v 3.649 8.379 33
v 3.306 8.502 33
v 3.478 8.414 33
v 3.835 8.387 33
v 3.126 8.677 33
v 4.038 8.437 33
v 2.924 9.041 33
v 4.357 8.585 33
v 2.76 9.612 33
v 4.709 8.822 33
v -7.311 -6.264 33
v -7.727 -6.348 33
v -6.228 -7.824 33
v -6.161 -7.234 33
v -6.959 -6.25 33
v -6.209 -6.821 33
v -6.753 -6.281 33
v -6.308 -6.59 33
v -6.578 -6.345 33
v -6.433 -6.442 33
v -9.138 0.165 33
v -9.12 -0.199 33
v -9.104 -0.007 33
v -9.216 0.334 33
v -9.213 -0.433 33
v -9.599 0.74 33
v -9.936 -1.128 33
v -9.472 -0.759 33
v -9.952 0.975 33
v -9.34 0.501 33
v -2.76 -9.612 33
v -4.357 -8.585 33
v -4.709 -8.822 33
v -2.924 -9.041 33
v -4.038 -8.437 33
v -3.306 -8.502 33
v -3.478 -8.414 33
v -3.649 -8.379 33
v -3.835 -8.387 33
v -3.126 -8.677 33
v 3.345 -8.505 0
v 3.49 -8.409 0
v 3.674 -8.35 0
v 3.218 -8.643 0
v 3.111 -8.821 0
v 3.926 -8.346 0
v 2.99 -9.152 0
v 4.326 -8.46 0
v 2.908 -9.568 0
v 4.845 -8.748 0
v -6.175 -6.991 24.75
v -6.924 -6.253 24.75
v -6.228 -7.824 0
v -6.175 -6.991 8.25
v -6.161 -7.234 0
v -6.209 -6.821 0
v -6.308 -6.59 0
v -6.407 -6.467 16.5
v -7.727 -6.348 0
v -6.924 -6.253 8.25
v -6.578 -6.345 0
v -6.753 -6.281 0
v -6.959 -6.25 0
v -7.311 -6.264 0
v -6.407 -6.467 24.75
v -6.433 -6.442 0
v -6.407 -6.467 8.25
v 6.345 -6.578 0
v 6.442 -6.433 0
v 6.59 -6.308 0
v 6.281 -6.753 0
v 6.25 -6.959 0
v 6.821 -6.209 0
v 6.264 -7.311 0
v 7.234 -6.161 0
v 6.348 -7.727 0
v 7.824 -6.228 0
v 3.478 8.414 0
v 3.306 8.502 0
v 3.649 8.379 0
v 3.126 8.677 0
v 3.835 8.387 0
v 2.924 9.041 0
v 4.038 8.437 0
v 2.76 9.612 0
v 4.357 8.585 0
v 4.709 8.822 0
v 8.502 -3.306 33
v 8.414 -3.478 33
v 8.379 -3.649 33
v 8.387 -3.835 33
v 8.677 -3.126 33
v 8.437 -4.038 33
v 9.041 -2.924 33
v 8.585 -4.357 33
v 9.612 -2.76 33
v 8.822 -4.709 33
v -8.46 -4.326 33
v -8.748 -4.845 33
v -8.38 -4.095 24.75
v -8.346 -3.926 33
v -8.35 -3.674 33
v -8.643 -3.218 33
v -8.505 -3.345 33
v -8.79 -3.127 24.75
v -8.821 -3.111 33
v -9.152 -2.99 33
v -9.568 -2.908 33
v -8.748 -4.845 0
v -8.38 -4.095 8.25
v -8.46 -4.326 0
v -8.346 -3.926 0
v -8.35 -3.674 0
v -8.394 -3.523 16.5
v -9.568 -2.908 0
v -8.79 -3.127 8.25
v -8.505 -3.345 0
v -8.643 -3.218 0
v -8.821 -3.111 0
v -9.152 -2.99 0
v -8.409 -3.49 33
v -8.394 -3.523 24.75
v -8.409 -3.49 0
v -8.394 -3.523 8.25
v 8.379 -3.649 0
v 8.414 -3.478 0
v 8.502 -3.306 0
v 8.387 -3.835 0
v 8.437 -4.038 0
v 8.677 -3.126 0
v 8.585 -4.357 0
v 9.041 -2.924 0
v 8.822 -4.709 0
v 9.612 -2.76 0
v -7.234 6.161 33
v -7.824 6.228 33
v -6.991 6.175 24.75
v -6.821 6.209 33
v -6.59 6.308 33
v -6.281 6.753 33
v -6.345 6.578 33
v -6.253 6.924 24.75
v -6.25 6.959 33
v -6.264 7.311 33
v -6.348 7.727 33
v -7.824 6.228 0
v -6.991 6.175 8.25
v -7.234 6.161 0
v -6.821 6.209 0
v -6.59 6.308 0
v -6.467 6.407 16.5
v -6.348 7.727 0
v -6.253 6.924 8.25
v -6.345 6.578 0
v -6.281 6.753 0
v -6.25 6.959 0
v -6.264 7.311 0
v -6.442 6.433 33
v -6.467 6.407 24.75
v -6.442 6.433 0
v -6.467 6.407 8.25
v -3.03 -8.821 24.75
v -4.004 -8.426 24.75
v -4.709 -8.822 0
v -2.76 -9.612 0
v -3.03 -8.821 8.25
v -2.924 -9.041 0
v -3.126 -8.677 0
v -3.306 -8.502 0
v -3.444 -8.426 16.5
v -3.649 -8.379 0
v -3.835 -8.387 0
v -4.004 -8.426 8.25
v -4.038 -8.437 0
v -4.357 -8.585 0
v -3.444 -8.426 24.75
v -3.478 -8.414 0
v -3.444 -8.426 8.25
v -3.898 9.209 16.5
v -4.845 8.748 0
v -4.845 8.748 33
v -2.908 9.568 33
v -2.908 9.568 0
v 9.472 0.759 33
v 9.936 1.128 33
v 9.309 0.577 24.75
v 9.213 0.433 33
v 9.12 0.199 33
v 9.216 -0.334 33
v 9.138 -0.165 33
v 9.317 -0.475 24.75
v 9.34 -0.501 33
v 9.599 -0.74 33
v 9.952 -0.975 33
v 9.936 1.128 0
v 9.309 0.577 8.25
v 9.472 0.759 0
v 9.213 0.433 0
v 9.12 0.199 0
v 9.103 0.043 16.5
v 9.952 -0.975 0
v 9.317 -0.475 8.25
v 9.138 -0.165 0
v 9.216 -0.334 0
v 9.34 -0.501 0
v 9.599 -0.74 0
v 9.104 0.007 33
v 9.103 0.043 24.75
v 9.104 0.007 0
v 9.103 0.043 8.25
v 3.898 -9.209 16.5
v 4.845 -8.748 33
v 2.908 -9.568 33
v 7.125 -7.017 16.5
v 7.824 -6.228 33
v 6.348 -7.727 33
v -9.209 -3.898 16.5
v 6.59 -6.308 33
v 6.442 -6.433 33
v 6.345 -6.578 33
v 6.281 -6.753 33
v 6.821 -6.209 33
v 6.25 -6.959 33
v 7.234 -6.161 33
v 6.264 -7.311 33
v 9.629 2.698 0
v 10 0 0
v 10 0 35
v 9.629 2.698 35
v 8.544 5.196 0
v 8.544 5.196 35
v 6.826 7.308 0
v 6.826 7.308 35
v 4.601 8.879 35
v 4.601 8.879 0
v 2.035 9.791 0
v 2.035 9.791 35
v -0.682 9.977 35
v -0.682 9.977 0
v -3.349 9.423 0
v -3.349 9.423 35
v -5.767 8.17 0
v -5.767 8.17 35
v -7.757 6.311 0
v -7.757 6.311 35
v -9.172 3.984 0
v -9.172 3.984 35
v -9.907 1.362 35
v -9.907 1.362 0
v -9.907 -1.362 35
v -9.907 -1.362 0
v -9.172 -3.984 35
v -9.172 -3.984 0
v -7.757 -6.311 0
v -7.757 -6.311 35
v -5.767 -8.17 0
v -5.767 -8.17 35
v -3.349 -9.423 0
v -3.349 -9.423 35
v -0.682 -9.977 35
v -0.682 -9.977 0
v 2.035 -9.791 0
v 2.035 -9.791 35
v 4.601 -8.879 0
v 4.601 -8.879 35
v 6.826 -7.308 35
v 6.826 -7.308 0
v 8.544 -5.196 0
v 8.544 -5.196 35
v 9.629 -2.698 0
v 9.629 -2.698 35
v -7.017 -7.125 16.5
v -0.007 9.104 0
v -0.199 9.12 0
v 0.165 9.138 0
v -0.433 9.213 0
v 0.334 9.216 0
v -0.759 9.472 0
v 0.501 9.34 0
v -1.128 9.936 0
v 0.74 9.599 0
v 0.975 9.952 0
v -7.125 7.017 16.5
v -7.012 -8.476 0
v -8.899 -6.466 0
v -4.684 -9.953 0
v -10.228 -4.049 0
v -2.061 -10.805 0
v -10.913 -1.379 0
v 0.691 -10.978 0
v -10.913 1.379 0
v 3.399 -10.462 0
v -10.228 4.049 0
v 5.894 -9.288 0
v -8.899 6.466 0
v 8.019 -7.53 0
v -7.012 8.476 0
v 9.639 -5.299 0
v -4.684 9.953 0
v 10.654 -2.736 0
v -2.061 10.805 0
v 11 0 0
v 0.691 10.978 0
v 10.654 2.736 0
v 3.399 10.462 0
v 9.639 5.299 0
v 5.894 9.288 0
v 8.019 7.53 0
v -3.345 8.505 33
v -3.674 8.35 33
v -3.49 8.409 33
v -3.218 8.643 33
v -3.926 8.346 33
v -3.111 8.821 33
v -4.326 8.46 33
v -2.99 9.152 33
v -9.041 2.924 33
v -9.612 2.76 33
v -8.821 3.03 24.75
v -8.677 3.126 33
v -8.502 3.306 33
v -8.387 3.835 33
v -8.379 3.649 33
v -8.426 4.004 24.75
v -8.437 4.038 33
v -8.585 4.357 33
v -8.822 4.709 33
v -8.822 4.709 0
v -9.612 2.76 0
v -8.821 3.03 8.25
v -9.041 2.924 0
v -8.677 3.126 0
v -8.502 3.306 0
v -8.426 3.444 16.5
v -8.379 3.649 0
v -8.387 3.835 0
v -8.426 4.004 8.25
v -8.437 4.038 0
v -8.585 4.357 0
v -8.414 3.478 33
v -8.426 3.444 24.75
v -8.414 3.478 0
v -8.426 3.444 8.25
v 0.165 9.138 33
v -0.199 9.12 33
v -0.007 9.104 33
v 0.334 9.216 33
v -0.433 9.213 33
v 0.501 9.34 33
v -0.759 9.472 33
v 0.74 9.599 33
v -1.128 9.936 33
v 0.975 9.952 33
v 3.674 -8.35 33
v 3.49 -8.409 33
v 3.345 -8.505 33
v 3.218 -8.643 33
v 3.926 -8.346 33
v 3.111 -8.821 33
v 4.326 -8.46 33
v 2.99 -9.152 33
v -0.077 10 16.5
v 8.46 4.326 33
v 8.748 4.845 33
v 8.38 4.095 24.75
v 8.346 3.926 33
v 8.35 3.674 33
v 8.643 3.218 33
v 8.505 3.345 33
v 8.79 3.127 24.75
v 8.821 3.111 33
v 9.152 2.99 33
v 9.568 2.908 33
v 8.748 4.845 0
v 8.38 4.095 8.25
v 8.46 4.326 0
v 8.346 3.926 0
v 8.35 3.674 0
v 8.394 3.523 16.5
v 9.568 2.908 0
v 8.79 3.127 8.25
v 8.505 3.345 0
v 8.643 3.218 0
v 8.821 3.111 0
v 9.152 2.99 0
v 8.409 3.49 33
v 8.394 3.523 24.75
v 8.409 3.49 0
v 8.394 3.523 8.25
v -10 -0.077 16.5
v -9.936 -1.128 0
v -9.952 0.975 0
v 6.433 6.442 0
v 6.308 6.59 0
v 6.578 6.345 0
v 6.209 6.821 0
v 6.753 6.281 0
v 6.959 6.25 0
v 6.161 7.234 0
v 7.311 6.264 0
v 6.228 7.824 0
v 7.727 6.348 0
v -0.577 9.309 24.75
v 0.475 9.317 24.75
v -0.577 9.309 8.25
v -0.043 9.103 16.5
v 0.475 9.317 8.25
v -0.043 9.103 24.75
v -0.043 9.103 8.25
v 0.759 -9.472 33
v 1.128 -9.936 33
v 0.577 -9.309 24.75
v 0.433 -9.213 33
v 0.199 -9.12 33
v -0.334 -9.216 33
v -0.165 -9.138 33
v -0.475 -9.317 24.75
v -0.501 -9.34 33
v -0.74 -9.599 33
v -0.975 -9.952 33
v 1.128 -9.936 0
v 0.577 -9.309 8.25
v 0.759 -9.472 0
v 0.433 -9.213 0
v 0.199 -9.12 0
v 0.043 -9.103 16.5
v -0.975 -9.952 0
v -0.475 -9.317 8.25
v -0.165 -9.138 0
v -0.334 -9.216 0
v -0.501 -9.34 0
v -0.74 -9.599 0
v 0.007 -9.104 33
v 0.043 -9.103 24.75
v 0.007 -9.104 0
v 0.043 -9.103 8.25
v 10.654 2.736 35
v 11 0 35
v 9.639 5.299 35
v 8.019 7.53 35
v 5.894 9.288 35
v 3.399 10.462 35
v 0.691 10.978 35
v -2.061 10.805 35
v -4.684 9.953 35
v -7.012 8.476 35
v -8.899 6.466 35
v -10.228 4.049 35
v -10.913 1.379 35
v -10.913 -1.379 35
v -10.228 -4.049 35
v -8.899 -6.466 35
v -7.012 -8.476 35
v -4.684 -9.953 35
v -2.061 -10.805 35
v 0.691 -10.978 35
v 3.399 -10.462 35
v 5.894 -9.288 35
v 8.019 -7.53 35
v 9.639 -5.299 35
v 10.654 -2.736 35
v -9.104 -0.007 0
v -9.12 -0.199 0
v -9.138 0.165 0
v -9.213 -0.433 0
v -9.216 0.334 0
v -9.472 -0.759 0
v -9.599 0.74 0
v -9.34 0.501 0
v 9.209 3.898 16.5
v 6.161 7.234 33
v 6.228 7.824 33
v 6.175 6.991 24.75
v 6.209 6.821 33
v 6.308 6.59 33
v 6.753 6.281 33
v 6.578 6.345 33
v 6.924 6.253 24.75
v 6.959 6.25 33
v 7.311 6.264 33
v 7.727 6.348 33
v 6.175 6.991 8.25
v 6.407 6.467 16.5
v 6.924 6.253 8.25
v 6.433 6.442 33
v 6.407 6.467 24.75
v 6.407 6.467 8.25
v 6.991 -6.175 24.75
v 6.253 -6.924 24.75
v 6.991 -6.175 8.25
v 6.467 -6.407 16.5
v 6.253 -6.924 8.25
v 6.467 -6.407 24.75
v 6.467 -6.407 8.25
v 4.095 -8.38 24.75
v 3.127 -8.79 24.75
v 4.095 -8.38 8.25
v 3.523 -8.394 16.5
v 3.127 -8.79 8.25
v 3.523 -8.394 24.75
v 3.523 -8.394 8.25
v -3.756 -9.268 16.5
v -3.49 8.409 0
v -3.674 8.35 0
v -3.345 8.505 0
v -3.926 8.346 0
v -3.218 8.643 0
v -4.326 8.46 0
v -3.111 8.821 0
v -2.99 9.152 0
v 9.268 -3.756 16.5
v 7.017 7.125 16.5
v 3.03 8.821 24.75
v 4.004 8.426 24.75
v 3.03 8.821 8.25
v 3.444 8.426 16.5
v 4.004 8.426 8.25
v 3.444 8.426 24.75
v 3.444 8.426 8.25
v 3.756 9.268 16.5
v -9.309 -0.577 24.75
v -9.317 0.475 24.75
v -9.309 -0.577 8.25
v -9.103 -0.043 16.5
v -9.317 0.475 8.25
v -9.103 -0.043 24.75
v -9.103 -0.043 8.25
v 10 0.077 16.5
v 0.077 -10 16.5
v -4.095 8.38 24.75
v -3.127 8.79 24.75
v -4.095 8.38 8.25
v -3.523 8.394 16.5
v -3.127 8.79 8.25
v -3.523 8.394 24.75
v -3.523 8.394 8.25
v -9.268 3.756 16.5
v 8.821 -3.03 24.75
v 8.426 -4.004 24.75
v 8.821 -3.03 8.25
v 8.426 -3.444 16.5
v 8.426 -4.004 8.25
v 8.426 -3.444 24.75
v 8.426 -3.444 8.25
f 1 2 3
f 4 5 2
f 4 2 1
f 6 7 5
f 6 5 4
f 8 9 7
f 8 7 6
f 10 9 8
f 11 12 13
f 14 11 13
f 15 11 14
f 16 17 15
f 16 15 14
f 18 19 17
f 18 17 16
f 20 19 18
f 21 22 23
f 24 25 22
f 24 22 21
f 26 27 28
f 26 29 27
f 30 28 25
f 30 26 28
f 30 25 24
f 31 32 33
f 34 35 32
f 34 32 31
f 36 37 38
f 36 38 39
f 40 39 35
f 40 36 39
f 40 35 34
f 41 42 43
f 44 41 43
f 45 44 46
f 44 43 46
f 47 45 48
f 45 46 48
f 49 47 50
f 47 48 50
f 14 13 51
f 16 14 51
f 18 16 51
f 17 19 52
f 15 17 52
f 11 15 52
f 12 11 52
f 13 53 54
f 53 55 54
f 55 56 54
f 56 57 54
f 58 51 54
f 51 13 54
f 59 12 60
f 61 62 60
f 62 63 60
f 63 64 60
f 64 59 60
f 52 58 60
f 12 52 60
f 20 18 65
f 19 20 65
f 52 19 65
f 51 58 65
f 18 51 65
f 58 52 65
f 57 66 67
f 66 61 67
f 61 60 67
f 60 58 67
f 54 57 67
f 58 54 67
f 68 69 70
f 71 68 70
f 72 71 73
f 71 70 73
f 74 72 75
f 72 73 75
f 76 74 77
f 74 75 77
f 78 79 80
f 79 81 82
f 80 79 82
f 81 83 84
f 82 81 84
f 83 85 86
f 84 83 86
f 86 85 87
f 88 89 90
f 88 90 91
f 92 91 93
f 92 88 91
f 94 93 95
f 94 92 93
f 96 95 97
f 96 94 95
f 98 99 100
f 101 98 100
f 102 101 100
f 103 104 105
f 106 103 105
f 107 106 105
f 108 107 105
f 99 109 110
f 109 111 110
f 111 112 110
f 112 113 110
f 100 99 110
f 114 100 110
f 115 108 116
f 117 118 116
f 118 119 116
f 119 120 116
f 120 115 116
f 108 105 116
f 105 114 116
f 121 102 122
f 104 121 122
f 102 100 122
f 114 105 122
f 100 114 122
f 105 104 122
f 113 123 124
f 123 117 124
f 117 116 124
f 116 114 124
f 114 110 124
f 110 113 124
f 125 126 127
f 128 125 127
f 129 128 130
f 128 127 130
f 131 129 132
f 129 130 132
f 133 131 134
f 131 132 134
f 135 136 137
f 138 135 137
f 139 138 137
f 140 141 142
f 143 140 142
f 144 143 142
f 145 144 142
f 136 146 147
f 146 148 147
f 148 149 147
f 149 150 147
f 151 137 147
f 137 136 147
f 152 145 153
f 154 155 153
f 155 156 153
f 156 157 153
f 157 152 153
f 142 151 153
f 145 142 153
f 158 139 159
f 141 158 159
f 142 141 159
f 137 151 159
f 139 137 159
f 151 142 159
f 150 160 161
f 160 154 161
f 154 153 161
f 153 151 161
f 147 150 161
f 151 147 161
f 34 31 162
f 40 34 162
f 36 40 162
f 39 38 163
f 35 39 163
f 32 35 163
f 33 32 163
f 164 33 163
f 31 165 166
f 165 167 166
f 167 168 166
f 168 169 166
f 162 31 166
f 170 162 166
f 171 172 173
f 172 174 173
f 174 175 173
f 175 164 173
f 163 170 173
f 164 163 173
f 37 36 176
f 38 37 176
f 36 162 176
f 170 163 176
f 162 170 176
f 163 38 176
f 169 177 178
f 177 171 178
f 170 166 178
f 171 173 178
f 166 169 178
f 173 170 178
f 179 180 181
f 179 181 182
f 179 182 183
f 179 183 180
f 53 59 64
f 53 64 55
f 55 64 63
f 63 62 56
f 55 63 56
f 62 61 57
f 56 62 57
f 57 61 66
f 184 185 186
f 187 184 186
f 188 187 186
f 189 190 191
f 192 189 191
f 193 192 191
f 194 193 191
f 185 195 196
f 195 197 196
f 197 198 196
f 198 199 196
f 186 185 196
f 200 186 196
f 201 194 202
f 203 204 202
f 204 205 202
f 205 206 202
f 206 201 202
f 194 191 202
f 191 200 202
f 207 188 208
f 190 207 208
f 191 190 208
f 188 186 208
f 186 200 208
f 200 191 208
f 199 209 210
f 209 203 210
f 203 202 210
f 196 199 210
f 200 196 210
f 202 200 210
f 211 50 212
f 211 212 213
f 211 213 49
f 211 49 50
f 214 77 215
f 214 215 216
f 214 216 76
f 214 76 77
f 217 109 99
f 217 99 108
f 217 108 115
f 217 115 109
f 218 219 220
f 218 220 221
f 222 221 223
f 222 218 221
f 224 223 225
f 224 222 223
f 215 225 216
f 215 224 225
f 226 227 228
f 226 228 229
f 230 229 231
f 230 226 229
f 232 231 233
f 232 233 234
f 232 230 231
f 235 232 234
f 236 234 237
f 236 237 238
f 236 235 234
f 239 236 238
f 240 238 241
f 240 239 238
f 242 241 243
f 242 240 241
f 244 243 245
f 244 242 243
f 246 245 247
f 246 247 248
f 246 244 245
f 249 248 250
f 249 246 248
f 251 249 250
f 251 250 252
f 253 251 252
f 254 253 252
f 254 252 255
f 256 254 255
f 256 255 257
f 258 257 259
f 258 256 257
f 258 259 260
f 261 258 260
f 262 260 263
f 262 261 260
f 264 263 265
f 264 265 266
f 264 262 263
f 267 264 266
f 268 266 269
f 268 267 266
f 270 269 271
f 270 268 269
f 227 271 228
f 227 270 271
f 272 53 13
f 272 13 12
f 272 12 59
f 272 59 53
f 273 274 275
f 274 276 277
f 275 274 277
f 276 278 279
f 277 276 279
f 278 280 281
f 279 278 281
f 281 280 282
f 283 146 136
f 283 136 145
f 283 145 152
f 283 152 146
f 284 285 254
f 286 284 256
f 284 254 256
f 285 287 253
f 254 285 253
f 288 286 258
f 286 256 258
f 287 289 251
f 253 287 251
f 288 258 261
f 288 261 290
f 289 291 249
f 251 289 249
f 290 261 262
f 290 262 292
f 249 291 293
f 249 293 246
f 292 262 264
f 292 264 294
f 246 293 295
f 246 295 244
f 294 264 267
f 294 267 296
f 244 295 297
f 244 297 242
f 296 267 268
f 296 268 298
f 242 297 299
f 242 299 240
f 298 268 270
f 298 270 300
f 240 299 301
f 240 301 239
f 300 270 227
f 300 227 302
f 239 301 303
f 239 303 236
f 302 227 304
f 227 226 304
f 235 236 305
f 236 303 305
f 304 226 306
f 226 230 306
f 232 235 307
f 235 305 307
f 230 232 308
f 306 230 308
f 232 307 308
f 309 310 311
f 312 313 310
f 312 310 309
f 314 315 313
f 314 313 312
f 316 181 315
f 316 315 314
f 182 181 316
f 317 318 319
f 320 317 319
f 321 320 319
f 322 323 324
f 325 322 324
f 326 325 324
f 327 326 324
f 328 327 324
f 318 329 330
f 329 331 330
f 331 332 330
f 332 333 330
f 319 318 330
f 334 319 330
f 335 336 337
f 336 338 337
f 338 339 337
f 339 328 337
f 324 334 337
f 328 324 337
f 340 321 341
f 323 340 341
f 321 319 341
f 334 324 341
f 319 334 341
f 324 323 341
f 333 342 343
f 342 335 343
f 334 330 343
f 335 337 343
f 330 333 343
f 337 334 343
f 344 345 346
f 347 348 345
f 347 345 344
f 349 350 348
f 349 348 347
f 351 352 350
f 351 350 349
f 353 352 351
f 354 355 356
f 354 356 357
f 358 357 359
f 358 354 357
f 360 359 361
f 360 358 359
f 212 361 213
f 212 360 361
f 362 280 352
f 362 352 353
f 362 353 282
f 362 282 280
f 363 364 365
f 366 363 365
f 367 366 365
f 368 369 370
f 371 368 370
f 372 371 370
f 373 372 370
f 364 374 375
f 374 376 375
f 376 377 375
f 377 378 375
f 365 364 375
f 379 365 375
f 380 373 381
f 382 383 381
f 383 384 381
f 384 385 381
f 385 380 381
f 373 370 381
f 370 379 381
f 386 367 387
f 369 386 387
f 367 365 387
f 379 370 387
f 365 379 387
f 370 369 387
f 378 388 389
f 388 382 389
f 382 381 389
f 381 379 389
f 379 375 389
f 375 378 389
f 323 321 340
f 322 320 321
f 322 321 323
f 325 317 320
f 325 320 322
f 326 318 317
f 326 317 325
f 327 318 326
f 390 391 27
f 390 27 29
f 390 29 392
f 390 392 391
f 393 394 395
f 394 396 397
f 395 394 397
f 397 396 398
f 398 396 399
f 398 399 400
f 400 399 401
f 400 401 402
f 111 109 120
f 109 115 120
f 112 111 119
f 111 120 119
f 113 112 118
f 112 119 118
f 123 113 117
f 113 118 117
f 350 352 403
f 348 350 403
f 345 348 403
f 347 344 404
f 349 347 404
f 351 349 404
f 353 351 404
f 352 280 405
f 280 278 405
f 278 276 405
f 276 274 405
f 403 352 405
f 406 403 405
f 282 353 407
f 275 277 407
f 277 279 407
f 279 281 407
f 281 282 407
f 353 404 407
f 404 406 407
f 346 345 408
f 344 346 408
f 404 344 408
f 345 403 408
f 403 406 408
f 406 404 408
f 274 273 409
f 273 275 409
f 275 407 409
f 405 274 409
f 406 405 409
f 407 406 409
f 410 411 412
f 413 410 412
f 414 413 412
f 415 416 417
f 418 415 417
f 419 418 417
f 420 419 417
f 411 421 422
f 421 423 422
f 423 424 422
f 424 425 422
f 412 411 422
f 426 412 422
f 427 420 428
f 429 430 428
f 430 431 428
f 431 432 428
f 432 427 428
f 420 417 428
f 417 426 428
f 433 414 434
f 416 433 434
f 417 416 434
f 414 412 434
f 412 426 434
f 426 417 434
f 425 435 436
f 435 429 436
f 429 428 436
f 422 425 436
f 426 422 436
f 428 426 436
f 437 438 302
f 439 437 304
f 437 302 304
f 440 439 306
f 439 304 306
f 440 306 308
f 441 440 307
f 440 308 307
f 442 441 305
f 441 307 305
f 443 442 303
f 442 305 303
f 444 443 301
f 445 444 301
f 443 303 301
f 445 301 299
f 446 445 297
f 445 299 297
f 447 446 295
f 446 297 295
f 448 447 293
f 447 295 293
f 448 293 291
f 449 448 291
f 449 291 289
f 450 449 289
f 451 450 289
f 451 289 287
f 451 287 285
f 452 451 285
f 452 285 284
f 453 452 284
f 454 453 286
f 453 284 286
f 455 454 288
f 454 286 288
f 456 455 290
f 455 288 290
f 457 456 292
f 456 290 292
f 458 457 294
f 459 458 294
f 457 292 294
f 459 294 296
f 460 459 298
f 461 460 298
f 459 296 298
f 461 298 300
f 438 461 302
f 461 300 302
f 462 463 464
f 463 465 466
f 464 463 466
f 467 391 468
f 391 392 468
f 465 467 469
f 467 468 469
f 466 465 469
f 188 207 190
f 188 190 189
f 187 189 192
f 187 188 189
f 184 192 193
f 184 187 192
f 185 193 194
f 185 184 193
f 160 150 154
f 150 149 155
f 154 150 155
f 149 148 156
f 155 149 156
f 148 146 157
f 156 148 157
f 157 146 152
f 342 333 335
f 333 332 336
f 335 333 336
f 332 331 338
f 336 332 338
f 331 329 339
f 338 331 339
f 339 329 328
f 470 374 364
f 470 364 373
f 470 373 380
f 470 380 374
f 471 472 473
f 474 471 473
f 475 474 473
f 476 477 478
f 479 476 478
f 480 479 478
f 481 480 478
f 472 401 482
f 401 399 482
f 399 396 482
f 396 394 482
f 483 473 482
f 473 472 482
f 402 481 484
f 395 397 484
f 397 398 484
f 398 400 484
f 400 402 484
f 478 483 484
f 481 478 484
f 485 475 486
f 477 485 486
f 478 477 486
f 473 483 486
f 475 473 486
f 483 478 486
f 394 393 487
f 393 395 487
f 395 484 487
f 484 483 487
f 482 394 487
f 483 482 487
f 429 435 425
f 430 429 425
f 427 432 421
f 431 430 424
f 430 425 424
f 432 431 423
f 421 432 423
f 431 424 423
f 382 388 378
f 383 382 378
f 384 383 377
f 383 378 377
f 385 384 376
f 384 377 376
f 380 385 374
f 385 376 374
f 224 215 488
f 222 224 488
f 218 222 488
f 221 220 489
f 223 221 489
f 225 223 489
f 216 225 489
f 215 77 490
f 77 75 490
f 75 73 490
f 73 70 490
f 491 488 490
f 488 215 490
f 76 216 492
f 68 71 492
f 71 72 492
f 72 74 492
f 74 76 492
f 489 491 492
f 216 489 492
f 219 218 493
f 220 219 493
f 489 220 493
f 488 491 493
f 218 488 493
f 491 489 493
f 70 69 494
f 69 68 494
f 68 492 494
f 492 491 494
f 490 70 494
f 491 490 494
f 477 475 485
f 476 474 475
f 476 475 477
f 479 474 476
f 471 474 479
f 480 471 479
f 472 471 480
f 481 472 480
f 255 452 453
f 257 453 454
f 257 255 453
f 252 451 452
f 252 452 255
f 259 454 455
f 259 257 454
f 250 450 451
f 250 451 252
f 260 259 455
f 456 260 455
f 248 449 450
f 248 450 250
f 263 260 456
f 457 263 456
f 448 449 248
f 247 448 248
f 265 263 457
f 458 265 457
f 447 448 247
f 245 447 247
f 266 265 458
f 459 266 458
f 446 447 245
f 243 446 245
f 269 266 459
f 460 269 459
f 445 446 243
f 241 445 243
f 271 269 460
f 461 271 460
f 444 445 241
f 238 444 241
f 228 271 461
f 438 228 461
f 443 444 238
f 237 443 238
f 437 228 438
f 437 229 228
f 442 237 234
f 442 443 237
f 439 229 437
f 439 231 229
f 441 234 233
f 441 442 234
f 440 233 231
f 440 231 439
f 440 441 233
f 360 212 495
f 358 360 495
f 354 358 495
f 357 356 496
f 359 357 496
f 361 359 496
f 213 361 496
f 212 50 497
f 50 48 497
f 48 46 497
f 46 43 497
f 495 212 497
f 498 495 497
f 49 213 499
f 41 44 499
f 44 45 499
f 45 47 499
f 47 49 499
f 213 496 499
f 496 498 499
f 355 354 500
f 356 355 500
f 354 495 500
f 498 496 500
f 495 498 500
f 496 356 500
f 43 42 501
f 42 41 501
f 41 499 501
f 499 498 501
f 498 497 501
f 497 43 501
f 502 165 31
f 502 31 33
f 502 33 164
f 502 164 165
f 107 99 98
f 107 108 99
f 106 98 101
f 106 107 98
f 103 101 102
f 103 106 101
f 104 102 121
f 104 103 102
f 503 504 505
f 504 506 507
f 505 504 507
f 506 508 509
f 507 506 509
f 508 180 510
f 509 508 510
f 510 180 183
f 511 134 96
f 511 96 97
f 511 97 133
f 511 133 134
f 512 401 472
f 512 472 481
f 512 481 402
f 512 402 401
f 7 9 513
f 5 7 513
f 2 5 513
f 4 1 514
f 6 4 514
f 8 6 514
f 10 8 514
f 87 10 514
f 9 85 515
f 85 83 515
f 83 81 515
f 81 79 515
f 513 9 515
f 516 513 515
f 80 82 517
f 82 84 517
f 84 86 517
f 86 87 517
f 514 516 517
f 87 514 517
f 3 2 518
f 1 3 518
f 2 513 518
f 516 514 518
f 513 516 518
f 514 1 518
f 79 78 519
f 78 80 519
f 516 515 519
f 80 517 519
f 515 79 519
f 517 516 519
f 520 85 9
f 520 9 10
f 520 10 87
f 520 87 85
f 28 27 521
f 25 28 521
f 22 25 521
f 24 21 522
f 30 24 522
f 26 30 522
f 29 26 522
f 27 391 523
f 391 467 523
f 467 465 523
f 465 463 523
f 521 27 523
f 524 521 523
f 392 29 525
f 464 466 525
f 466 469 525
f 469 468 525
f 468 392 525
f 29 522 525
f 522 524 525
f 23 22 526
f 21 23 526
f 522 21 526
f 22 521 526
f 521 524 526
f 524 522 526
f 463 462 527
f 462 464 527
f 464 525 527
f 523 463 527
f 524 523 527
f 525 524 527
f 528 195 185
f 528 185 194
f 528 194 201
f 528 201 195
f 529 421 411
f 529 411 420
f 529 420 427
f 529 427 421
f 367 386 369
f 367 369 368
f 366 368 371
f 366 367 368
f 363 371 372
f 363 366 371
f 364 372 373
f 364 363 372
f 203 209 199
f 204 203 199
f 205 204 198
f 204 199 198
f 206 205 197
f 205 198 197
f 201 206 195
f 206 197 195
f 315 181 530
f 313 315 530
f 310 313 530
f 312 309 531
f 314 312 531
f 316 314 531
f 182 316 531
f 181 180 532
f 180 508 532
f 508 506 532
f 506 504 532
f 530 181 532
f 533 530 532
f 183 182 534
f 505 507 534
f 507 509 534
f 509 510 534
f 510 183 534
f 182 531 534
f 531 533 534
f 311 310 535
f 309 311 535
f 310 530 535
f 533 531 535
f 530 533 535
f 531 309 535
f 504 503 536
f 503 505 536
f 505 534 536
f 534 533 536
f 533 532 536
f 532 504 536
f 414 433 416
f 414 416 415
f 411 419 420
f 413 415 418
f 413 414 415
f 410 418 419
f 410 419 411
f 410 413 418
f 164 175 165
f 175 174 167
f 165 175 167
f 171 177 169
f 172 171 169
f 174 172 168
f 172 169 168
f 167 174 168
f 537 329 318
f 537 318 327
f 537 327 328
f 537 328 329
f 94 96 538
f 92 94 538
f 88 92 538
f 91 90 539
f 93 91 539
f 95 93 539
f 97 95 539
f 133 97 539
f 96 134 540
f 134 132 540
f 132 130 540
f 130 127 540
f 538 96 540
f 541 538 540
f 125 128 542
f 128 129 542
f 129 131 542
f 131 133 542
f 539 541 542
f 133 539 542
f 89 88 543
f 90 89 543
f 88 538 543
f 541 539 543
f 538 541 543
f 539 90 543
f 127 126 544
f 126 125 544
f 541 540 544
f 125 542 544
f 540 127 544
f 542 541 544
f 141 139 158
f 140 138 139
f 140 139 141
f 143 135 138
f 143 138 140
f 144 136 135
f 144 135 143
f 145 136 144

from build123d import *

# Parameters (mm, degrees)
SKETCH1_R              = 11
SKETCH1_R_2            = 10
BOSS_EXTRUDE1_DEPTH    = 35
BOSS_EXTRUDE2_DEPTH    = 33
BOSS_EXTRUDE2_2_DEPTH  = 33
BOSS_EXTRUDE2_3_DEPTH  = 33
BOSS_EXTRUDE2_4_DEPTH  = 33
BOSS_EXTRUDE2_5_DEPTH  = 33
BOSS_EXTRUDE2_6_DEPTH  = 33
BOSS_EXTRUDE2_7_DEPTH  = 33
BOSS_EXTRUDE2_8_DEPTH  = 33
BOSS_EXTRUDE2_9_DEPTH  = 33
BOSS_EXTRUDE2_10_DEPTH = 33
BOSS_EXTRUDE2_11_DEPTH = 33
BOSS_EXTRUDE2_12_DEPTH = 33
BOSS_EXTRUDE2_13_DEPTH = 33
BOSS_EXTRUDE2_14_DEPTH = 33
BOSS_EXTRUDE2_15_DEPTH = 33
BOSS_EXTRUDE2_16_DEPTH = 33


with BuildPart() as part:
    # Sketch1 → Boss-Extrude1 (new body)
    with BuildSketch(Plane.XY):
        Circle(SKETCH1_R)
        Circle(SKETCH1_R_2, mode=Mode.SUBTRACT)
    extrude(amount=BOSS_EXTRUDE1_DEPTH)


with BuildPart() as body_2:
    # Sketch2 → Boss-Extrude2 (new body)
    with BuildSketch(Plane(origin=(0, 0, 0), x_dir=(-1, 0, 0), z_dir=(0, 0, -1))):
        with BuildLine():
            add(Edge.make_bspline(
                [(-1.128056704, -9.936170695), (-0.00880064, -8.26174576), (0.975113037, -9.952344174)],
                knots=[0, 0, 0, 1, 1, 1], degree=2))
            add(Edge.make_bspline(
                [(-1.128056704, -9.936170695), (-0.076898223, -10.055152863), (0.975113037, -9.952344174)],
                knots=[0, 0, 0, 1, 1, 1], degree=2))
        make_face()
    extrude(amount=-BOSS_EXTRUDE2_DEPTH)


with BuildPart() as body_3:
    # Sketch2 → Boss-Extrude2 2 (new body)
    with BuildSketch(Plane(origin=(0, 0, 0), x_dir=(-1, 0, 0), z_dir=(0, 0, -1))):
        with BuildLine():
            add(Edge.make_bspline(
                [(-4.844596406, -8.748136125), (-3.169763956, -7.629489952), (-2.907710252, -9.567926687)],
                knots=[0, 0, 0, 1, 1, 1], degree=2))
            add(Edge.make_bspline(
                [(-4.844596406, -8.748136125), (-3.918985104, -9.26032225), (-2.907710252, -9.567926687)],
                knots=[0, 0, 0, 1, 1, 1], degree=2))
        make_face()
    extrude(amount=-BOSS_EXTRUDE2_2_DEPTH)


with BuildPart() as body_4:
    # Sketch2 → Boss-Extrude2 3 (new body)
    with BuildSketch(Plane(origin=(0, 0, 0), x_dir=(-1, 0, 0), z_dir=(0, 0, -1))):
        with BuildLine():
            add(Edge.make_bspline(
                [(-7.823590222, -6.228277132), (-5.848159444, -5.835713459), (-6.347861013, -7.726879095)],
                knots=[0, 0, 0, 1, 1, 1], degree=2))
            add(Edge.make_bspline(
                [(-7.823590222, -6.228277132), (-7.16444203, -7.05569152), (-6.347861013, -7.726879095)],
                knots=[0, 0, 0, 1, 1, 1], degree=2))
        make_face()
    extrude(amount=-BOSS_EXTRUDE2_3_DEPTH)


with BuildPart() as body_5:
    # Sketch2 → Boss-Extrude2 4 (new body)
    with BuildSketch(Plane(origin=(0, 0, 0), x_dir=(-1, 0, 0), z_dir=(0, 0, -1))):
        with BuildLine():
            add(Edge.make_bspline(
                [(-9.611513348, -2.760219406), (-7.63622567, -3.153502494), (-8.821607479, -4.709484206)],
                knots=[0, 0, 0, 1, 1, 1], degree=2))
            add(Edge.make_bspline(
                [(-9.611513348, -2.760219406), (-9.319177602, -3.776895716), (-8.821607479, -4.709484206)],
                knots=[0, 0, 0, 1, 1, 1], degree=2))
        make_face()
    extrude(amount=-BOSS_EXTRUDE2_4_DEPTH)


with BuildPart() as body_6:
    # Sketch2 → Boss-Extrude2 5 (new body)
    with BuildSketch(Plane(origin=(0, 0, 0), x_dir=(-1, 0, 0), z_dir=(0, 0, -1))):
        with BuildLine():
            add(Edge.make_bspline(
                [(-9.936170695, 1.128056704), (-8.26174576, 0.00880064), (-9.952344174, -0.975113037)],
                knots=[0, 0, 0, 1, 1, 1], degree=2))
            add(Edge.make_bspline(
                [(-9.936170695, 1.128056704), (-10.055152863, 0.076898223), (-9.952344174, -0.975113037)],
                knots=[0, 0, 0, 1, 1, 1], degree=2))
        make_face()
    extrude(amount=-BOSS_EXTRUDE2_5_DEPTH)


with BuildPart() as body_7:
    # Sketch2 → Boss-Extrude2 6 (new body)
    with BuildSketch(Plane(origin=(0, 0, 0), x_dir=(-1, 0, 0), z_dir=(0, 0, -1))):
        with BuildLine():
            add(Edge.make_bspline(
                [(-8.748136125, 4.844596406), (-7.629489952, 3.169763956), (-9.567926687, 2.907710252)],
                knots=[0, 0, 0, 1, 1, 1], degree=2))
            add(Edge.make_bspline(
                [(-8.748136125, 4.844596406), (-9.26032225, 3.918985104), (-9.567926687, 2.907710252)],
                knots=[0, 0, 0, 1, 1, 1], degree=2))
        make_face()
    extrude(amount=-BOSS_EXTRUDE2_6_DEPTH)


with BuildPart() as body_8:
    # Sketch2 → Boss-Extrude2 7 (new body)
    with BuildSketch(Plane(origin=(0, 0, 0), x_dir=(-1, 0, 0), z_dir=(0, 0, -1))):
        with BuildLine():
            add(Edge.make_bspline(
                [(-6.228277132, 7.823590222), (-5.835713459, 5.848159444), (-7.726879095, 6.347861013)],
                knots=[0, 0, 0, 1, 1, 1], degree=2))
            add(Edge.make_bspline(
                [(-6.228277132, 7.823590222), (-7.05569152, 7.16444203), (-7.726879095, 6.347861013)],
                knots=[0, 0, 0, 1, 1, 1], degree=2))
        make_face()
    extrude(amount=-BOSS_EXTRUDE2_7_DEPTH)


with BuildPart() as body_9:
    # Sketch2 → Boss-Extrude2 8 (new body)
    with BuildSketch(Plane(origin=(0, 0, 0), x_dir=(-1, 0, 0), z_dir=(0, 0, -1))):
        with BuildLine():
            add(Edge.make_bspline(
                [(-2.760219406, 9.611513348), (-3.153502494, 7.63622567), (-4.709484206, 8.821607479)],
                knots=[0, 0, 0, 1, 1, 1], degree=2))
            add(Edge.make_bspline(
                [(-2.760219406, 9.611513348), (-3.776895716, 9.319177602), (-4.709484206, 8.821607479)],
                knots=[0, 0, 0, 1, 1, 1], degree=2))
        make_face()
    extrude(amount=-BOSS_EXTRUDE2_8_DEPTH)


with BuildPart() as body_10:
    # Sketch2 → Boss-Extrude2 9 (new body)
    with BuildSketch(Plane(origin=(0, 0, 0), x_dir=(-1, 0, 0), z_dir=(0, 0, -1))):
        with BuildLine():
            add(Edge.make_bspline(
                [(1.128056704, 9.936170695), (0.00880064, 8.26174576), (-0.975113037, 9.952344174)],
                knots=[0, 0, 0, 1, 1, 1], degree=2))
            add(Edge.make_bspline(
                [(1.128056704, 9.936170695), (0.076898223, 10.055152863), (-0.975113037, 9.952344174)],
                knots=[0, 0, 0, 1, 1, 1], degree=2))
        make_face()
    extrude(amount=-BOSS_EXTRUDE2_9_DEPTH)


with BuildPart() as body_11:
    # Sketch2 → Boss-Extrude2 10 (new body)
    with BuildSketch(Plane(origin=(0, 0, 0), x_dir=(-1, 0, 0), z_dir=(0, 0, -1))):
        with BuildLine():
            add(Edge.make_bspline(
                [(4.844596406, 8.748136125), (3.169763956, 7.629489952), (2.907710252, 9.567926687)],
                knots=[0, 0, 0, 1, 1, 1], degree=2))
            add(Edge.make_bspline(
                [(4.844596406, 8.748136125), (3.918985104, 9.26032225), (2.907710252, 9.567926687)],
                knots=[0, 0, 0, 1, 1, 1], degree=2))
        make_face()
    extrude(amount=-BOSS_EXTRUDE2_10_DEPTH)


with BuildPart() as body_12:
    # Sketch2 → Boss-Extrude2 11 (new body)
    with BuildSketch(Plane(origin=(0, 0, 0), x_dir=(-1, 0, 0), z_dir=(0, 0, -1))):
        with BuildLine():
            add(Edge.make_bspline(
                [(7.823590222, 6.228277132), (5.848159444, 5.835713459), (6.347861013, 7.726879095)],
                knots=[0, 0, 0, 1, 1, 1], degree=2))
            add(Edge.make_bspline(
                [(7.823590222, 6.228277132), (7.16444203, 7.05569152), (6.347861013, 7.726879095)],
                knots=[0, 0, 0, 1, 1, 1], degree=2))
        make_face()
    extrude(amount=-BOSS_EXTRUDE2_11_DEPTH)


with BuildPart() as body_13:
    # Sketch2 → Boss-Extrude2 12 (new body)
    with BuildSketch(Plane(origin=(0, 0, 0), x_dir=(-1, 0, 0), z_dir=(0, 0, -1))):
        with BuildLine():
            add(Edge.make_bspline(
                [(9.611513348, 2.760219406), (7.63622567, 3.153502494), (8.821607479, 4.709484206)],
                knots=[0, 0, 0, 1, 1, 1], degree=2))
            add(Edge.make_bspline(
                [(9.611513348, 2.760219406), (9.319177602, 3.776895716), (8.821607479, 4.709484206)],
                knots=[0, 0, 0, 1, 1, 1], degree=2))
        make_face()
    extrude(amount=-BOSS_EXTRUDE2_12_DEPTH)


with BuildPart() as body_14:
    # Sketch2 → Boss-Extrude2 13 (new body)
    with BuildSketch(Plane(origin=(0, 0, 0), x_dir=(-1, 0, 0), z_dir=(0, 0, -1))):
        with BuildLine():
            add(Edge.make_bspline(
                [(9.936170695, -1.128056704), (8.26174576, -0.00880064), (9.952344174, 0.975113037)],
                knots=[0, 0, 0, 1, 1, 1], degree=2))
            add(Edge.make_bspline(
                [(9.936170695, -1.128056704), (10.055152863, -0.076898223), (9.952344174, 0.975113037)],
                knots=[0, 0, 0, 1, 1, 1], degree=2))
        make_face()
    extrude(amount=-BOSS_EXTRUDE2_13_DEPTH)


with BuildPart() as body_15:
    # Sketch2 → Boss-Extrude2 14 (new body)
    with BuildSketch(Plane(origin=(0, 0, 0), x_dir=(-1, 0, 0), z_dir=(0, 0, -1))):
        with BuildLine():
            add(Edge.make_bspline(
                [(8.748136125, -4.844596406), (7.629489952, -3.169763956), (9.567926687, -2.907710252)],
                knots=[0, 0, 0, 1, 1, 1], degree=2))
            add(Edge.make_bspline(
                [(8.748136125, -4.844596406), (9.26032225, -3.918985104), (9.567926687, -2.907710252)],
                knots=[0, 0, 0, 1, 1, 1], degree=2))
        make_face()
    extrude(amount=-BOSS_EXTRUDE2_14_DEPTH)


with BuildPart() as body_16:
    # Sketch2 → Boss-Extrude2 15 (new body)
    with BuildSketch(Plane(origin=(0, 0, 0), x_dir=(-1, 0, 0), z_dir=(0, 0, -1))):
        with BuildLine():
            add(Edge.make_bspline(
                [(6.228277132, -7.823590222), (5.835713459, -5.848159444), (7.726879095, -6.347861013)],
                knots=[0, 0, 0, 1, 1, 1], degree=2))
            add(Edge.make_bspline(
                [(6.228277132, -7.823590222), (7.05569152, -7.16444203), (7.726879095, -6.347861013)],
                knots=[0, 0, 0, 1, 1, 1], degree=2))
        make_face()
    extrude(amount=-BOSS_EXTRUDE2_15_DEPTH)


with BuildPart() as body_17:
    # Sketch2 → Boss-Extrude2 16 (new body)
    with BuildSketch(Plane(origin=(0, 0, 0), x_dir=(-1, 0, 0), z_dir=(0, 0, -1))):
        with BuildLine():
            add(Edge.make_bspline(
                [(2.760219406, -9.611513348), (3.153502494, -7.63622567), (4.709484206, -8.821607479)],
                knots=[0, 0, 0, 1, 1, 1], degree=2))
            add(Edge.make_bspline(
                [(2.760219406, -9.611513348), (3.776895716, -9.319177602), (4.709484206, -8.821607479)],
                knots=[0, 0, 0, 1, 1, 1], degree=2))
        make_face()
    extrude(amount=-BOSS_EXTRUDE2_16_DEPTH)


solid = Compound([part.part, body_2.part, body_3.part, body_4.part, body_5.part, body_6.part, body_7.part, body_8.part, body_9.part, body_10.part, body_11.part, body_12.part, body_13.part, body_14.part, body_15.part, body_16.part, body_17.part])
